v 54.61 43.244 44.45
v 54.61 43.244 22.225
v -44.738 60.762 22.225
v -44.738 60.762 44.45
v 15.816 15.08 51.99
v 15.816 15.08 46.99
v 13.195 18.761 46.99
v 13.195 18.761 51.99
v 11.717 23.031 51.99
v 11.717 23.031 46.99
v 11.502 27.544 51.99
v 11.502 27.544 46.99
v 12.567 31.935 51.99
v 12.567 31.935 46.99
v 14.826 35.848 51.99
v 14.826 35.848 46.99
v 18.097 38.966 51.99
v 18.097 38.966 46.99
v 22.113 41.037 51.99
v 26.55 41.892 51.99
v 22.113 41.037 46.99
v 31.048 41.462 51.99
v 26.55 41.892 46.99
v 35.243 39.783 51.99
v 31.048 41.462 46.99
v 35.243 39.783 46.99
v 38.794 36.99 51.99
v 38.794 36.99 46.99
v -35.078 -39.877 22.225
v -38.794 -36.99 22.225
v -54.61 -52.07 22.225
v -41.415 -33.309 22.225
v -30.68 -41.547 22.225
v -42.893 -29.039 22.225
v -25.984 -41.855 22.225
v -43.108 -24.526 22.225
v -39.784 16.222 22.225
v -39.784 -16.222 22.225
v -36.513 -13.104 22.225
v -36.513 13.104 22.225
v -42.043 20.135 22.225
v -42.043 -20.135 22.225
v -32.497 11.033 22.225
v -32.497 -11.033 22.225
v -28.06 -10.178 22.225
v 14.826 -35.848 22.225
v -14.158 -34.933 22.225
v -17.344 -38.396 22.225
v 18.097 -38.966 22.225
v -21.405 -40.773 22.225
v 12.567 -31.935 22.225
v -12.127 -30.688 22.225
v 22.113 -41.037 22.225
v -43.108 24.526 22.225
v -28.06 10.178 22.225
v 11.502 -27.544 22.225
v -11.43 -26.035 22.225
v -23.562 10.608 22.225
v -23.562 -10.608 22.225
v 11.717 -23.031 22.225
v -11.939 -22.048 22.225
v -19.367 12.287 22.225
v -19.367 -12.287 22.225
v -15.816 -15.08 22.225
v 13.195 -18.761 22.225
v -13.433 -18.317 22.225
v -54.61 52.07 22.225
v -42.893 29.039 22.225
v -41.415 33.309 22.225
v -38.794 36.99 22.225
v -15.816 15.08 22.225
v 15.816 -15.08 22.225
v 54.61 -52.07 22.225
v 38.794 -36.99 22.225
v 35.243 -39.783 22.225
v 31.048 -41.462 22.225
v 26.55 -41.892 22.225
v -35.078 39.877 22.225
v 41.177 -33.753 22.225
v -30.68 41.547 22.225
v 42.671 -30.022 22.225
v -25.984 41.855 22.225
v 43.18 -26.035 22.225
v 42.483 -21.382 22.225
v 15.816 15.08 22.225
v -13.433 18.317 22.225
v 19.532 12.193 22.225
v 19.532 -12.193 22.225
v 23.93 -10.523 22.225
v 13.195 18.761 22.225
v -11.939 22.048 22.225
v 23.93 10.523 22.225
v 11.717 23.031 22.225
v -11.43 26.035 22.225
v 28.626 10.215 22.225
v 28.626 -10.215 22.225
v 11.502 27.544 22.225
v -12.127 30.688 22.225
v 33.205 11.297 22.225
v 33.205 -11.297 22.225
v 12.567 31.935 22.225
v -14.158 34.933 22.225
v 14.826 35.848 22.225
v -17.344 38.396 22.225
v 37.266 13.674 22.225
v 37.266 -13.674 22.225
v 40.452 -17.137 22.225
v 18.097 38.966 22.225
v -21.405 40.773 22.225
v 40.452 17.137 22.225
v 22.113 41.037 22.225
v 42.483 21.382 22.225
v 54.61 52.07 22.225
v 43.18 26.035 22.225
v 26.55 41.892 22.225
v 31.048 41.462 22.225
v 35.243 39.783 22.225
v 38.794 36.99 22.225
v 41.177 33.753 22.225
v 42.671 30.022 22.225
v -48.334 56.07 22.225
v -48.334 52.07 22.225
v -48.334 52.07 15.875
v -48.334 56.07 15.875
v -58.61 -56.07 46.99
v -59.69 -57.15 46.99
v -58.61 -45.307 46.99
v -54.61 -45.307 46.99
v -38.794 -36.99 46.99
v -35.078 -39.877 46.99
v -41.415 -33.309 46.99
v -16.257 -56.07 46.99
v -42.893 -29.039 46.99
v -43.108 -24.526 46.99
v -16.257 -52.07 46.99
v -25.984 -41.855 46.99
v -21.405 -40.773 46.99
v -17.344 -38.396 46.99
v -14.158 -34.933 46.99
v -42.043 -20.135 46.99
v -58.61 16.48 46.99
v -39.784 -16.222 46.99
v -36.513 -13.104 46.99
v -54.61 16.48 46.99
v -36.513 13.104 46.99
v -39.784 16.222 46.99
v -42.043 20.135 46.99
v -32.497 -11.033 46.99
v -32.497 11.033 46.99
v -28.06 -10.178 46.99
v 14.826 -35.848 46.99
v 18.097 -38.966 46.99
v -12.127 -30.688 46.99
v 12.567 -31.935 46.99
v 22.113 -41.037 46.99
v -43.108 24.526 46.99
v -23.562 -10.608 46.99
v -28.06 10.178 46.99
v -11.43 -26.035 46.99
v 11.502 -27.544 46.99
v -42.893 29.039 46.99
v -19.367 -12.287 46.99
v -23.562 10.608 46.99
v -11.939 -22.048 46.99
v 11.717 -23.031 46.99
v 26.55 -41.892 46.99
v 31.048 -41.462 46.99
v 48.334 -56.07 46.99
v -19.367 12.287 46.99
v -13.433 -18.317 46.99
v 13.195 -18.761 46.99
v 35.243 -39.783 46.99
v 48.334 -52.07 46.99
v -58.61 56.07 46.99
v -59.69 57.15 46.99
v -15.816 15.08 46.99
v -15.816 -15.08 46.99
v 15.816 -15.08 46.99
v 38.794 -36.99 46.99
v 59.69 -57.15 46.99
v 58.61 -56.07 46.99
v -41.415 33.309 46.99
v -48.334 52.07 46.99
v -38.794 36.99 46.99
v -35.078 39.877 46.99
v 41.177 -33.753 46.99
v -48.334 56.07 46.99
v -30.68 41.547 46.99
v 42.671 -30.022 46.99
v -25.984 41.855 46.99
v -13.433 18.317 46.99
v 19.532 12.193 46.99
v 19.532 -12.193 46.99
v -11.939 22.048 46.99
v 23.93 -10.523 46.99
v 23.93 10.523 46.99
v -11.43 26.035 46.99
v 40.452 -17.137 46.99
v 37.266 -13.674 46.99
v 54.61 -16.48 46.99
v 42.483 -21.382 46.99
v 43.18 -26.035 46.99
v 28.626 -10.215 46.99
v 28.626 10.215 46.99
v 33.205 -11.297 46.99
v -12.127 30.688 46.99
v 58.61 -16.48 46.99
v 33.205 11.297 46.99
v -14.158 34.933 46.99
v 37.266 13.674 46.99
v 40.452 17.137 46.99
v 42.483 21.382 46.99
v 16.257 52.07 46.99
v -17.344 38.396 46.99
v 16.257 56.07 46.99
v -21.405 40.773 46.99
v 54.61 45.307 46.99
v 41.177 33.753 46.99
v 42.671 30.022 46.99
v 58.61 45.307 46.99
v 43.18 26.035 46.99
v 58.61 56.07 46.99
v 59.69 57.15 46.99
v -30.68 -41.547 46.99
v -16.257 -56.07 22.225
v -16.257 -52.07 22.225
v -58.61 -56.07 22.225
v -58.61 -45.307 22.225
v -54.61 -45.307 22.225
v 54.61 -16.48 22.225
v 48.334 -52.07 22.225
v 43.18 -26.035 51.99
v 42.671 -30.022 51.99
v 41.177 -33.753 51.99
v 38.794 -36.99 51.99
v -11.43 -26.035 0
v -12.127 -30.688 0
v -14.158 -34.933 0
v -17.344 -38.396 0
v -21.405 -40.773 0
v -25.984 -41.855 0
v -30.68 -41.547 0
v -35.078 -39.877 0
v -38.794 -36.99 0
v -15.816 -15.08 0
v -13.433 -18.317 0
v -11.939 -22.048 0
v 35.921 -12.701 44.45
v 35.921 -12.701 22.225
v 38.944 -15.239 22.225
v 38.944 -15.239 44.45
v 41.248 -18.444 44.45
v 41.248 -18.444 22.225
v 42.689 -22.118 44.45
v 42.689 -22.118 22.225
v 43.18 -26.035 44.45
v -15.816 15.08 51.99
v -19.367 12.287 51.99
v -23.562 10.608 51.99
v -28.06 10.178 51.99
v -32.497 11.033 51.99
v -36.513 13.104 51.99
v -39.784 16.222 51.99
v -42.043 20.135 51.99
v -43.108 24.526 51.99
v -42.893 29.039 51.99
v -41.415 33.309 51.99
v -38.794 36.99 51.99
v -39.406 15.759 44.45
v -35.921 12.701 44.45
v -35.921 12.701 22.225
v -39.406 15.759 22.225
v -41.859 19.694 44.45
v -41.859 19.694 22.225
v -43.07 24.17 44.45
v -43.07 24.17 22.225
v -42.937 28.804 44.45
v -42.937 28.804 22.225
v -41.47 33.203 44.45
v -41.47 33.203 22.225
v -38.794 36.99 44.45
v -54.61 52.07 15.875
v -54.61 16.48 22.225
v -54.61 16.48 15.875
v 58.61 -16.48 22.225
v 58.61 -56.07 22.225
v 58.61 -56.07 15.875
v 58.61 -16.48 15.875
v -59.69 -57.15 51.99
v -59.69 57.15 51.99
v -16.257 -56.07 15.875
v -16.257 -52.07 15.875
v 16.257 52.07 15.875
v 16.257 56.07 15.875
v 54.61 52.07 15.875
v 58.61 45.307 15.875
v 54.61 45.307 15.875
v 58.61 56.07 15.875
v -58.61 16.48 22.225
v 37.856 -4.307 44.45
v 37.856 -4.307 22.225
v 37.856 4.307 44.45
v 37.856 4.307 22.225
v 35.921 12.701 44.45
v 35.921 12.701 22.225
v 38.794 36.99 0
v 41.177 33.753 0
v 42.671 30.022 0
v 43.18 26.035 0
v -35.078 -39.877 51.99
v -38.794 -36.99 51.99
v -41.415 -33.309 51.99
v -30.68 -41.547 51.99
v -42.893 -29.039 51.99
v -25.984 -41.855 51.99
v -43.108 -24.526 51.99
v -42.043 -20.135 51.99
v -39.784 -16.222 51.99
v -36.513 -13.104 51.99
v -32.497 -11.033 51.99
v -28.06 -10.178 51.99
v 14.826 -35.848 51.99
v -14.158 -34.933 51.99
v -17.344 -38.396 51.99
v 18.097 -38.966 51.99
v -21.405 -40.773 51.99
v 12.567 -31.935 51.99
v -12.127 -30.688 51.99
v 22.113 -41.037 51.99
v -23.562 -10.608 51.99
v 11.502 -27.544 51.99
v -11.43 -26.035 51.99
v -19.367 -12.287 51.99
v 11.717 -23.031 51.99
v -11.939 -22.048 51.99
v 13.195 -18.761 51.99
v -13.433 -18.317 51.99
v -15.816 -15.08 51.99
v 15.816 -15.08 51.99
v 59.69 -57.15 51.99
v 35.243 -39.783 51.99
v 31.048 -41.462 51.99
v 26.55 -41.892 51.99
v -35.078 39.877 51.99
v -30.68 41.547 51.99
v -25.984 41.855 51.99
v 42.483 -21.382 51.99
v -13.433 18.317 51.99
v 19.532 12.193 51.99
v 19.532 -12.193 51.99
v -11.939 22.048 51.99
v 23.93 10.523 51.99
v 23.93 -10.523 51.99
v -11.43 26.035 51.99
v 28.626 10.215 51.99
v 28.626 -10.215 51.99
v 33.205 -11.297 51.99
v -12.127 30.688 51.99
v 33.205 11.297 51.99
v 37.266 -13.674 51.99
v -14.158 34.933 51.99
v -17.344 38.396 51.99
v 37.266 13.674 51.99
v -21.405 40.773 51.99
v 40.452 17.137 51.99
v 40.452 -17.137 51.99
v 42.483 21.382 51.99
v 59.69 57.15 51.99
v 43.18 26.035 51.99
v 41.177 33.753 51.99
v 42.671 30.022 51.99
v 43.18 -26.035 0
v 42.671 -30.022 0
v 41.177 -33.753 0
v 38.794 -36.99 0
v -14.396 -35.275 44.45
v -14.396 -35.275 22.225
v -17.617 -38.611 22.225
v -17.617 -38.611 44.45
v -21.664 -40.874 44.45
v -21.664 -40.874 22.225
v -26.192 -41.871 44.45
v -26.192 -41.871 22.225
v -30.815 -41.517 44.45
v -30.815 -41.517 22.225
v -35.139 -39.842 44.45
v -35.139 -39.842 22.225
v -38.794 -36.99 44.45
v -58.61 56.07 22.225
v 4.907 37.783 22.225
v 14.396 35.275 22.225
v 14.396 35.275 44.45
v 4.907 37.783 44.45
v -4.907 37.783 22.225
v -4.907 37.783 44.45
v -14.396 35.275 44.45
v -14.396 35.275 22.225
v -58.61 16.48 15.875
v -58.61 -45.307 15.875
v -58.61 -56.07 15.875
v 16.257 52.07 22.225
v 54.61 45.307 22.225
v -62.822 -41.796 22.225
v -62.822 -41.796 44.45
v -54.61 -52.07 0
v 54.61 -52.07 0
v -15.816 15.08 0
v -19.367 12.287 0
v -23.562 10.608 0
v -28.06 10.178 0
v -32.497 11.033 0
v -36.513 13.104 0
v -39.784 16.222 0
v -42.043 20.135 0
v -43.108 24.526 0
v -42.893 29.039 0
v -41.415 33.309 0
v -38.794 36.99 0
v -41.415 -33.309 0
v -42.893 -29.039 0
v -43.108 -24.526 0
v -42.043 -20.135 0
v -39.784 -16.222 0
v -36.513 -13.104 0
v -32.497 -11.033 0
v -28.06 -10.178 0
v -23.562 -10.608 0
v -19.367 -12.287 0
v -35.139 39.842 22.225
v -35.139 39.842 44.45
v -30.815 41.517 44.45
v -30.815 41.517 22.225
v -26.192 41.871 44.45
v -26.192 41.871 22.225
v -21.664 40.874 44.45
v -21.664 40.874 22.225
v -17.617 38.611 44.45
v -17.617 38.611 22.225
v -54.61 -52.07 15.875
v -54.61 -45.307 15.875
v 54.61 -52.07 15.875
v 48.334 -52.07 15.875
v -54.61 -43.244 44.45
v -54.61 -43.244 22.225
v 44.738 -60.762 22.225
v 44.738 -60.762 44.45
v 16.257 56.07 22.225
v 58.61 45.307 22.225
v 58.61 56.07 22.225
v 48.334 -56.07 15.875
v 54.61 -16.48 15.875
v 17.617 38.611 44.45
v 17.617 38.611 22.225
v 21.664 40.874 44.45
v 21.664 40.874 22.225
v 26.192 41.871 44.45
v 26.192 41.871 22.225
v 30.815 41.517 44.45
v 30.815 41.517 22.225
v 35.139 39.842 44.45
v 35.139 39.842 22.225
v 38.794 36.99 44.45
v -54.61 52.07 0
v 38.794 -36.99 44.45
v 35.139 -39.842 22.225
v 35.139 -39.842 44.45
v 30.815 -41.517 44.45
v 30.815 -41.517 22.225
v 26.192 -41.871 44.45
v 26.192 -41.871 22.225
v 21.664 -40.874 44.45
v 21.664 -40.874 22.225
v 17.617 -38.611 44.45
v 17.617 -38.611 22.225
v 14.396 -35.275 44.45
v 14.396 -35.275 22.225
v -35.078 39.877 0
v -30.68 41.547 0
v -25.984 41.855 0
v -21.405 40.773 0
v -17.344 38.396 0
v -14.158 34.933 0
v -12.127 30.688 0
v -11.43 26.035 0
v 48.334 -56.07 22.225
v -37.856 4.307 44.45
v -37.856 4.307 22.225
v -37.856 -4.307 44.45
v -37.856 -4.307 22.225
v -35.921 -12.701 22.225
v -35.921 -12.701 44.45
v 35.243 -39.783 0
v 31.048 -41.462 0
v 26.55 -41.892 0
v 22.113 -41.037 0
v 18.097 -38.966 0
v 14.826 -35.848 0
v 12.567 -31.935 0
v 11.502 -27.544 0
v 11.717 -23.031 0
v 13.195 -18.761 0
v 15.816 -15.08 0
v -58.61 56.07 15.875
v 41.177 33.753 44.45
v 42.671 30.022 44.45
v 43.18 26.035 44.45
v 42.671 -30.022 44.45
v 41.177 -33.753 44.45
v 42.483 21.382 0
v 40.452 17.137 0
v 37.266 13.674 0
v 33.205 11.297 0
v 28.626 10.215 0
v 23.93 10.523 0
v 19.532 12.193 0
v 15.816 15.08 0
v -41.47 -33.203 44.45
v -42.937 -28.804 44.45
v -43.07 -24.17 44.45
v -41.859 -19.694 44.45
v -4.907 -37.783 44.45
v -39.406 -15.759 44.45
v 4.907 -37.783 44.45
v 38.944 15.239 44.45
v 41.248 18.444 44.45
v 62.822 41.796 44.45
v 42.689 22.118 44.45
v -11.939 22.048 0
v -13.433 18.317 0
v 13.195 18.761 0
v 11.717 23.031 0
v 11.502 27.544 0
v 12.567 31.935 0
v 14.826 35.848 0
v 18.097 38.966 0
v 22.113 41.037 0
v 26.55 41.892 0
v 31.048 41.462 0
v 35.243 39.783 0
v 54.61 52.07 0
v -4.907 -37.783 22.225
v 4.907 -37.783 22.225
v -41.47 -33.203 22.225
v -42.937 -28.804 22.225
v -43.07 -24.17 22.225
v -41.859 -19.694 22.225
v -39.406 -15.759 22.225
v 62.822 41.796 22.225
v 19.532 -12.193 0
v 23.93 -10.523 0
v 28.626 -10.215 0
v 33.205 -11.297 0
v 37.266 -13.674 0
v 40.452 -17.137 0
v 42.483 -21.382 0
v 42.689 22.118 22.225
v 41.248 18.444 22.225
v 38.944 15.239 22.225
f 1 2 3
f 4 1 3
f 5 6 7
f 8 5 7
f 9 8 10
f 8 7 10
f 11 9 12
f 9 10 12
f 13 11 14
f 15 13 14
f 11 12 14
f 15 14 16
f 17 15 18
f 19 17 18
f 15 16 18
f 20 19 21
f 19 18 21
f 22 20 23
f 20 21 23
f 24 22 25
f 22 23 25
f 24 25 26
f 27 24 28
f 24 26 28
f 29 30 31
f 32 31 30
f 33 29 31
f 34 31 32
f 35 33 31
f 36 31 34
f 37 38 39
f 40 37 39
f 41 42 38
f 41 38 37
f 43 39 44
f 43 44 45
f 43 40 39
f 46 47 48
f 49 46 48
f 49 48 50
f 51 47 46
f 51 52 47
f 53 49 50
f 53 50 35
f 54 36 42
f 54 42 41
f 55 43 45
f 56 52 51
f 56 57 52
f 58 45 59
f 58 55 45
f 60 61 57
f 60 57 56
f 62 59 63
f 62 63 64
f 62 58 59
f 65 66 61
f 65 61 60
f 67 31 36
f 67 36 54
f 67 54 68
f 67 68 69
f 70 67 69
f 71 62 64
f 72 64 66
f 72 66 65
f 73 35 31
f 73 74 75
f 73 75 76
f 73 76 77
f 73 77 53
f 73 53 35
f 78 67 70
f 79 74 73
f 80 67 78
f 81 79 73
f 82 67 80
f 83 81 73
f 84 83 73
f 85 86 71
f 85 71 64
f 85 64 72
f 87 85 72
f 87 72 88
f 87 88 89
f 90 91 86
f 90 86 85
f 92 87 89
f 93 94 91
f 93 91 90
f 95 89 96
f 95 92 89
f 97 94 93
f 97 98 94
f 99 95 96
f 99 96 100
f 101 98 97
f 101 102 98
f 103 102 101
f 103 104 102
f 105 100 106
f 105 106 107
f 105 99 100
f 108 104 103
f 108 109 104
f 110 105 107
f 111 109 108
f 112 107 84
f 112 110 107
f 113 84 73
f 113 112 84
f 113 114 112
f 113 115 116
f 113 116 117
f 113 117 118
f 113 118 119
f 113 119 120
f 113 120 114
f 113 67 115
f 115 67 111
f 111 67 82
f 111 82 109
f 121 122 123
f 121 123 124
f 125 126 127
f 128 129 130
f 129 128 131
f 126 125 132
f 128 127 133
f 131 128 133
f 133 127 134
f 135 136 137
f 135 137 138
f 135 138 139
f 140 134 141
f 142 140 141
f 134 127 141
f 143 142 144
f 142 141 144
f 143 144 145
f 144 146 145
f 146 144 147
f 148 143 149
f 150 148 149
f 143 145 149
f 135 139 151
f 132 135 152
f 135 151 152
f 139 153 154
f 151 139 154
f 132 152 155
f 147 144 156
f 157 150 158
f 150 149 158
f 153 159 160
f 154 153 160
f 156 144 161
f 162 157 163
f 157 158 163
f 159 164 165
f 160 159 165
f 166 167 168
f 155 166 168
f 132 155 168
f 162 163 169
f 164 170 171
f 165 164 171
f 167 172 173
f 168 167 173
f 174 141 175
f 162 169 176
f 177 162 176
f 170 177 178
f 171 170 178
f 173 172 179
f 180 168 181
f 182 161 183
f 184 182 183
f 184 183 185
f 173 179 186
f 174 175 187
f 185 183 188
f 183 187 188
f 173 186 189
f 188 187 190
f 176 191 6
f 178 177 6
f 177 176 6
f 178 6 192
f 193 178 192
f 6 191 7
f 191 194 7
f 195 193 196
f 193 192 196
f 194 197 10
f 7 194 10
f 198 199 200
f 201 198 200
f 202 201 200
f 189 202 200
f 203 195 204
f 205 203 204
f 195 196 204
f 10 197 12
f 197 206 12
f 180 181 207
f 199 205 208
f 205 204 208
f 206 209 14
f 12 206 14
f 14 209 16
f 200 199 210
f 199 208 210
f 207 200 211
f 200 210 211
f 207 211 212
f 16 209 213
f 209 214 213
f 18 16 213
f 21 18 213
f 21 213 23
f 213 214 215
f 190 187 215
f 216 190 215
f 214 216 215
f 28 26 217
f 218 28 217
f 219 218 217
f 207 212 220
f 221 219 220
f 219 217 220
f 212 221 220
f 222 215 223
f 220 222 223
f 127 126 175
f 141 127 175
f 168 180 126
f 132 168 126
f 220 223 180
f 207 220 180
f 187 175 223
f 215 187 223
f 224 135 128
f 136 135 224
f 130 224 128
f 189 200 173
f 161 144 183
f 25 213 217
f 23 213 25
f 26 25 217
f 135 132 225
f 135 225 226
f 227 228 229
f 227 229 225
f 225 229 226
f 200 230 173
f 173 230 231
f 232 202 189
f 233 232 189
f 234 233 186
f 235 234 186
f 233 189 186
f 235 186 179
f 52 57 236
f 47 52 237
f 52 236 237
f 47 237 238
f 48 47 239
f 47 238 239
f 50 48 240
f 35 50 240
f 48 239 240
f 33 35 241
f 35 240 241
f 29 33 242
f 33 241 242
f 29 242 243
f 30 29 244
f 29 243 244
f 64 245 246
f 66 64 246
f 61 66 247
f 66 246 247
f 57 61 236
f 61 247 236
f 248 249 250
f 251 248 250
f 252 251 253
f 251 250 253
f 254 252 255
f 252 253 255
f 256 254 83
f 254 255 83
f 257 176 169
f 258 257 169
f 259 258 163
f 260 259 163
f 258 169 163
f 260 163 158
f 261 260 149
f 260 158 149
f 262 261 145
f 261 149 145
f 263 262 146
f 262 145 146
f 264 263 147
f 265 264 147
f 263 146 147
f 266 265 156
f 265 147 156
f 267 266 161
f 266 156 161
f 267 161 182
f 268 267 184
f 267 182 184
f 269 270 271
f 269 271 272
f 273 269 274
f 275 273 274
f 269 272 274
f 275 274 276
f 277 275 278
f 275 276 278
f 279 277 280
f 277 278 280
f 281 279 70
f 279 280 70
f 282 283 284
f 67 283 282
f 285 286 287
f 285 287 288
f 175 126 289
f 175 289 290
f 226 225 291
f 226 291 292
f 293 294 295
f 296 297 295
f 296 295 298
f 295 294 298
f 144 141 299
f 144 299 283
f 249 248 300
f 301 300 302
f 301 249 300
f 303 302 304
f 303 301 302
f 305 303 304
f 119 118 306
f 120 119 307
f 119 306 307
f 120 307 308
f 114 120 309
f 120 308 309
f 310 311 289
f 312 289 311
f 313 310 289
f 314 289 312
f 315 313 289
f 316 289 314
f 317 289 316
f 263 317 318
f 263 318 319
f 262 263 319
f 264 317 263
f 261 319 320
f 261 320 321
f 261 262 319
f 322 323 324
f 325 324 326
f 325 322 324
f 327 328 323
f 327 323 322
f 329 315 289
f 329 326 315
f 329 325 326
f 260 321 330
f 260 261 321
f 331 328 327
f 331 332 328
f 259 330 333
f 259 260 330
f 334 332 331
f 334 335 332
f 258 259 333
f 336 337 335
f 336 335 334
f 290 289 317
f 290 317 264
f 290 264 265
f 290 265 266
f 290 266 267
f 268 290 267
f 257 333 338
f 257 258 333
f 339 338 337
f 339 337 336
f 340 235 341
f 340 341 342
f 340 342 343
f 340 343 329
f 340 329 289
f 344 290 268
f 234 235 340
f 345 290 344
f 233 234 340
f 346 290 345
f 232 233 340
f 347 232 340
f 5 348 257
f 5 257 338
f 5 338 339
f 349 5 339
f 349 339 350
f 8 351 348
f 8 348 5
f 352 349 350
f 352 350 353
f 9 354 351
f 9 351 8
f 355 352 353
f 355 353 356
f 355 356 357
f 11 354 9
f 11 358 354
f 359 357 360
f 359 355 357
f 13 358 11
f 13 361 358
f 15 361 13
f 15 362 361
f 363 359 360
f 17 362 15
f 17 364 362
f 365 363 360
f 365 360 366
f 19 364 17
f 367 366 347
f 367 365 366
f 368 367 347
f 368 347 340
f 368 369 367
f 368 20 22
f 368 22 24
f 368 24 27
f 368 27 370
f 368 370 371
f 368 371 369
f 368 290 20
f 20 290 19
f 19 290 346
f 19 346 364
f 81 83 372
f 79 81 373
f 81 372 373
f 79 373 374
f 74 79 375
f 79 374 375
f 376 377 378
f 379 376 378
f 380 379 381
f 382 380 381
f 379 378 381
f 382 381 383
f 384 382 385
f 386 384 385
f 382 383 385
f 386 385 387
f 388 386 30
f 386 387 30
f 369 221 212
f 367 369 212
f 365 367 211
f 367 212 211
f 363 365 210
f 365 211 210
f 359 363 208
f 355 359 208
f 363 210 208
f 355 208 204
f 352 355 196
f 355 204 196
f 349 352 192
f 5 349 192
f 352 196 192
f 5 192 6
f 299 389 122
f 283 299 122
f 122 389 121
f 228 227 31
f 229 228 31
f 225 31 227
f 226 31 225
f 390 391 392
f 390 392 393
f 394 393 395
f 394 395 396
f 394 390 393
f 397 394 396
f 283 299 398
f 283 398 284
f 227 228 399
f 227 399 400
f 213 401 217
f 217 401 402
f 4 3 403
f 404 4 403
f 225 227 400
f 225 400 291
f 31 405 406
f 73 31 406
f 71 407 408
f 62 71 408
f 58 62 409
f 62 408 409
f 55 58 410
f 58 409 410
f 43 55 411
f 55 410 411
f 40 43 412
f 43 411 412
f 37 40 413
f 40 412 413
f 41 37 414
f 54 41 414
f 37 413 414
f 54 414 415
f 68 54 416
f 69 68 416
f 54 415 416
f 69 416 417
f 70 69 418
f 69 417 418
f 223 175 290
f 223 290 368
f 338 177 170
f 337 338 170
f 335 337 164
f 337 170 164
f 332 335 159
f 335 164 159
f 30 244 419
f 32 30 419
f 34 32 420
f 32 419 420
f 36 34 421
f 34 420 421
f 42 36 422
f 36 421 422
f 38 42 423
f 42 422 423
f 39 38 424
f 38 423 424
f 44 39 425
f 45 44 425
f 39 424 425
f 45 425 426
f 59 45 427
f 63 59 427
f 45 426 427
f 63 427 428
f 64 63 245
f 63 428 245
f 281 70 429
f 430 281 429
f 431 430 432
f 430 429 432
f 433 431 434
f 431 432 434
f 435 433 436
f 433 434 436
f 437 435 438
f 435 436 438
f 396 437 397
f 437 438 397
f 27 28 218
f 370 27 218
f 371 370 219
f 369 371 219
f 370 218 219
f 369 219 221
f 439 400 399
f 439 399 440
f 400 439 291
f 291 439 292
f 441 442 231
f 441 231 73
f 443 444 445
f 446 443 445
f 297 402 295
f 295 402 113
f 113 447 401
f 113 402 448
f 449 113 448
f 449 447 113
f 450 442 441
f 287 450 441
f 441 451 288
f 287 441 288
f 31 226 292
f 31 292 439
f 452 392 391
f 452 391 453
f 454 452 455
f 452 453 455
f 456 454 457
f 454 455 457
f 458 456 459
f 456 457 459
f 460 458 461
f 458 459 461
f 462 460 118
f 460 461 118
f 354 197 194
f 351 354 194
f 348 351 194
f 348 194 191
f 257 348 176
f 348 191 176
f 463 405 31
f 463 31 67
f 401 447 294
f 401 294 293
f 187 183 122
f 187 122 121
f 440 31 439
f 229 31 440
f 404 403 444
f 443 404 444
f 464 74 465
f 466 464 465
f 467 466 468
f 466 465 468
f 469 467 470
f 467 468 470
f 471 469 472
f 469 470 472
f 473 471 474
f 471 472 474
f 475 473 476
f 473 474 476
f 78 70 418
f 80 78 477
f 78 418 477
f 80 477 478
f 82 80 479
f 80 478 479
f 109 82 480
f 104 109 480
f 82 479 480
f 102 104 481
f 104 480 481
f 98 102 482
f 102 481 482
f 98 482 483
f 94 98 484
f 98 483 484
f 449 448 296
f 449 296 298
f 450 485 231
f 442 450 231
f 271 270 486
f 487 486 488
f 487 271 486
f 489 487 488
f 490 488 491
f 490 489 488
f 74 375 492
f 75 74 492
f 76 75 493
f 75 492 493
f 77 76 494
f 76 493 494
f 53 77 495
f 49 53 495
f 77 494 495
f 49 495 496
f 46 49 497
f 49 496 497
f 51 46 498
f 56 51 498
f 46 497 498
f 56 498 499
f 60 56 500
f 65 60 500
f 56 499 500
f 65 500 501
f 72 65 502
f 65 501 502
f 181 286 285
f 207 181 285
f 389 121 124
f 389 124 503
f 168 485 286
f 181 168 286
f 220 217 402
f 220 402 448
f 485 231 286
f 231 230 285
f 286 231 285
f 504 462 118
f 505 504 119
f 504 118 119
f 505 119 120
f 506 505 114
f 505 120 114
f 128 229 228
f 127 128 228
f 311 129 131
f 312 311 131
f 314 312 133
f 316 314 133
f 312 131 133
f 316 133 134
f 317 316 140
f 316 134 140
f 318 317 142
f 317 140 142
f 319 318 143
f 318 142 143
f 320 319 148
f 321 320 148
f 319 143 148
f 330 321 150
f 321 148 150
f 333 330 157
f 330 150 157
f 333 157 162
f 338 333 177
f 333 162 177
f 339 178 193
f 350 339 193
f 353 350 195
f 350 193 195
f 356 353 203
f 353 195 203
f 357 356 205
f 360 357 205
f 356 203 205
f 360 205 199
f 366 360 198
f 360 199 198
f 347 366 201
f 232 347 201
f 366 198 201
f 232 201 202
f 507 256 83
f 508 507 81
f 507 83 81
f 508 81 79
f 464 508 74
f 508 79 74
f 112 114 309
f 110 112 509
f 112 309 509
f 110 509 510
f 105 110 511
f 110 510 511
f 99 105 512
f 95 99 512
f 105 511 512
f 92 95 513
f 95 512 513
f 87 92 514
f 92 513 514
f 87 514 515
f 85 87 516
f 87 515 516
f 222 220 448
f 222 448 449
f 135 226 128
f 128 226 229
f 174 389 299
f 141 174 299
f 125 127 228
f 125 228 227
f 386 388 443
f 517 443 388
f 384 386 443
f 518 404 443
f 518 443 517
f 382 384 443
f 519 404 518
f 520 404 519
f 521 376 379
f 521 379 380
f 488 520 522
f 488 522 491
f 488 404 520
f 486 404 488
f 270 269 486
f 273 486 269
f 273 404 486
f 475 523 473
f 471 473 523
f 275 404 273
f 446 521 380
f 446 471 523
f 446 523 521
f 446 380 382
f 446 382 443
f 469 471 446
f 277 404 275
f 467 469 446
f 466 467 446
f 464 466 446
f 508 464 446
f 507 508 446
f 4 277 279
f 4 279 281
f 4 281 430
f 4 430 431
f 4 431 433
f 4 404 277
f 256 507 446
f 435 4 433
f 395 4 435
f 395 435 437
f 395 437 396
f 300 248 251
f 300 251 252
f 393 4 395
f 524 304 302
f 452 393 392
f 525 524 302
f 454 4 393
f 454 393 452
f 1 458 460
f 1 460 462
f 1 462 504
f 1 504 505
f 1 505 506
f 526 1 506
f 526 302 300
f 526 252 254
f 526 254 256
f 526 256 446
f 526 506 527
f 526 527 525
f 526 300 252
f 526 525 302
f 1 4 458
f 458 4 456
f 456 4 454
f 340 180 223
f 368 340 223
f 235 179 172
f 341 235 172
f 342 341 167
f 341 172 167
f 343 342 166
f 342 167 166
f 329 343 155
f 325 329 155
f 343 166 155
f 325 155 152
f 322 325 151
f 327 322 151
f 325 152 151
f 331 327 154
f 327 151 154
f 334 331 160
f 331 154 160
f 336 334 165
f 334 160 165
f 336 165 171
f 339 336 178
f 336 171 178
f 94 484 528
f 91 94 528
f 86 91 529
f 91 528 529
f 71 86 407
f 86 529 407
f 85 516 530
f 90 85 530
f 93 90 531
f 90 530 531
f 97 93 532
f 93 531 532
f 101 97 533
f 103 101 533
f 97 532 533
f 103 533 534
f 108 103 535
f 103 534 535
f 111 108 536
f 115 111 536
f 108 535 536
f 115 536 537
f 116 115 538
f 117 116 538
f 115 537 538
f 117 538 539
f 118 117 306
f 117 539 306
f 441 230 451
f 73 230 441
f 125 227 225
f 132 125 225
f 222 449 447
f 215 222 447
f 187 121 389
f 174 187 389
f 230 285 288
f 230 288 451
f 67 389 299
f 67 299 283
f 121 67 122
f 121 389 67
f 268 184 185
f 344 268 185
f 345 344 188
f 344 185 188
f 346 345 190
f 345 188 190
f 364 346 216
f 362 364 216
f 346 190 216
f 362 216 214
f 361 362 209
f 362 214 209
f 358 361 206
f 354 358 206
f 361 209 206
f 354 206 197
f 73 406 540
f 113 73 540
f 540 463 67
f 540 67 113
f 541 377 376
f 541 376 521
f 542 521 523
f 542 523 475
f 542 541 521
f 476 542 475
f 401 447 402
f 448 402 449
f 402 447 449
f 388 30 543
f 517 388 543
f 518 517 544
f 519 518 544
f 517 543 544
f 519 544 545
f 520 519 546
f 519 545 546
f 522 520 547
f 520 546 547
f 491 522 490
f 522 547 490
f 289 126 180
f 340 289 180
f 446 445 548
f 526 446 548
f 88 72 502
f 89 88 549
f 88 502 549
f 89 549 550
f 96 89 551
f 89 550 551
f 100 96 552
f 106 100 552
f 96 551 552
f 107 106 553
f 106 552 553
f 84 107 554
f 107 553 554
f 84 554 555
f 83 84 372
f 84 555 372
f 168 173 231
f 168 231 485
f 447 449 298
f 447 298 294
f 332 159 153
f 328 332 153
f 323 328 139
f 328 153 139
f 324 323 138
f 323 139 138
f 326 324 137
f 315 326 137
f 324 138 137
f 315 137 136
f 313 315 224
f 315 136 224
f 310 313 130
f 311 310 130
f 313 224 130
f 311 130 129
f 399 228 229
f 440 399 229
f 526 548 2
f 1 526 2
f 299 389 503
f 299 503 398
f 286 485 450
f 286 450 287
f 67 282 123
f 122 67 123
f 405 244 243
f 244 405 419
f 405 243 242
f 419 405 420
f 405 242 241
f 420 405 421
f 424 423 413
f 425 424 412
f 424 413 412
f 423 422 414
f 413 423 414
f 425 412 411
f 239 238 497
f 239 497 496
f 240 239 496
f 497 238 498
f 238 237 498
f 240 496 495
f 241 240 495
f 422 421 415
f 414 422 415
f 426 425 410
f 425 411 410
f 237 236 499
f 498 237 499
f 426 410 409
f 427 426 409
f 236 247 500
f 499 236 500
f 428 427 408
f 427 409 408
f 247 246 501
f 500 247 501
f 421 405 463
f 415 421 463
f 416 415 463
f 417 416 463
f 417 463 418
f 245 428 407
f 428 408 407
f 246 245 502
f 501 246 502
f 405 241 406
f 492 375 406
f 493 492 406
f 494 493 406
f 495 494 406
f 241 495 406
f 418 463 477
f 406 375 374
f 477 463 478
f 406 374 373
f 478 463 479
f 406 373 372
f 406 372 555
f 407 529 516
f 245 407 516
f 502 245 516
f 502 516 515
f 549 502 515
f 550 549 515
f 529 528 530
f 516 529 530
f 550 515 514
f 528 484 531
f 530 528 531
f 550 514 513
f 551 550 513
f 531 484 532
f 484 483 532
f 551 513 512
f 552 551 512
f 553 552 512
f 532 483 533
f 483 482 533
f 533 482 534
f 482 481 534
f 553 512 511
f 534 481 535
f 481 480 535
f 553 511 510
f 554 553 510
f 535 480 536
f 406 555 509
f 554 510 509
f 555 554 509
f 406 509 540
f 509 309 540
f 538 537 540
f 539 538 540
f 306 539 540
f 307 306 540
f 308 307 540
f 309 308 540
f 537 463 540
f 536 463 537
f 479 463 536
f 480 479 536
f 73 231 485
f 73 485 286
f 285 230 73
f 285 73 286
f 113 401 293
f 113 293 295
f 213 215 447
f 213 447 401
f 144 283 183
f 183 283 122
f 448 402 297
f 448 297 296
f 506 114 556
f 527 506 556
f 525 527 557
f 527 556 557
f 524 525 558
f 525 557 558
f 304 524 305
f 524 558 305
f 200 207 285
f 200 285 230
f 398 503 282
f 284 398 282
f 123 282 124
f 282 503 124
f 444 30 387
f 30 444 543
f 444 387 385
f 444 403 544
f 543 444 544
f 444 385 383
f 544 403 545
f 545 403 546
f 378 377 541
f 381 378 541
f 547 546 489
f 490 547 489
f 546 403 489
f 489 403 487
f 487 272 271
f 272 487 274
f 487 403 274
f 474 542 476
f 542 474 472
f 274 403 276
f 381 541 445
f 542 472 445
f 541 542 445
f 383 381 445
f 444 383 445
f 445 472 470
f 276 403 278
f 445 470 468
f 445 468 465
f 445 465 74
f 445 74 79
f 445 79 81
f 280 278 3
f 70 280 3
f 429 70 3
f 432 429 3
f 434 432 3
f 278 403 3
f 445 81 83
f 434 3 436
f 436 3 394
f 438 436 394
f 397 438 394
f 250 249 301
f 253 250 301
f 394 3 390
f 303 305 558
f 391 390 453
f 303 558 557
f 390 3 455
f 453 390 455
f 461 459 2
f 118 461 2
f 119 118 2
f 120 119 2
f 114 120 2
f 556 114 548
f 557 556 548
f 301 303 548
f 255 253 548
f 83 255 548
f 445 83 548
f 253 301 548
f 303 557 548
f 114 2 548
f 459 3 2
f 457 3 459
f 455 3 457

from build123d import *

# Parameters (mm, degrees)
F0_W      = 109.22
F0_H      = 104.14
F1_DEPTH  = 22.225
F2_R      = 38.1
F3_DEPTH  = 22.225
F4_W      = 6.2755517351
F4_H      = 4
F5_DEPTH  = 6.35
F4_W_2    = 4
F4_H_2    = 6.7626058602
F6_DEPTH  = 25.4
F8_W      = 119.38
F8_H      = 114.3
F9_DEPTH  = 5
F11_DEPTH = 89.408


with BuildPart() as f1:
    # F0 (on Top) → F1 (new body)
    with BuildSketch(Plane.XY):
        Rectangle(F0_W, F0_H)
    extrude(amount=F1_DEPTH)


with BuildPart() as f3:
    # F2 (on face) → F3 (new body)
    with BuildSketch(Plane.XY.offset(22.225)):
        Polygon((-4.5555347098, -52.07), (44.7384907809, -60.7618666817), (46.2711013896, -52.07), align=None)
        Polygon((-54.61, -43.2440472644), (-4.5555347098, -52.07), (46.2711013896, -52.07), (54.61, -4.7777559152), (54.61, 43.2440472644), (4.5555347098, 52.07), (-46.2711013896, 52.07), (-54.61, 4.7777559152), align=None)
        Circle(F2_R, mode=Mode.SUBTRACT)
        Polygon((54.61, 43.2440472644), (54.61, -4.7777559152), (62.8222120031, 41.796012717), align=None)
        Polygon((-44.7384907809, 60.7618666817), (-46.2711013896, 52.07), (4.5555347098, 52.07), align=None)
        Polygon((-62.8222120031, -41.796012717), (-54.61, -43.2440472644), (-54.61, 4.7777559152), align=None)
    extrude(amount=F3_DEPTH)


with BuildPart() as f5:
    # F4 (on face) → F5 (new body)
    with BuildSketch(Plane.XY.offset(22.225)):
        with Locations((-51.4722241325, 54.07)):
            Rectangle(F4_W, F4_H)
        Polygon((-54.61, 16.4795775369), (-54.61, 52.07), (-54.61, 56.07), (-58.61, 56.07), (-58.61, 16.4795775369), align=None)
    extrude(amount=-F5_DEPTH)


with BuildPart() as f5b:
    # F4 (on face) → F5, piece 2 (new body)
    with BuildSketch(Plane.XY.offset(22.225)):
        with Locations((-56.61, -48.6886970699)):
            Rectangle(F4_W_2, F4_H_2)
        Polygon((-16.2573563315, -56.07), (-16.2573563315, -52.07), (-54.61, -52.07), (-58.61, -52.07), (-58.61, -56.07), align=None)
    extrude(amount=-F5_DEPTH)


with BuildPart() as f5c:
    # F4 (on face) → F5, piece 3 (new body)
    with BuildSketch(Plane.XY.offset(22.225)):
        with Locations((51.4722241325, -54.07)):
            Rectangle(F4_W, F4_H)
        Polygon((58.61, -16.4795775369), (54.61, -16.4795775369), (54.61, -52.07), (54.61, -56.07), (58.61, -56.07), align=None)
    extrude(amount=-F5_DEPTH)


with BuildPart() as f5d:
    # F4 (on face) → F5, piece 4 (new body)
    with BuildSketch(Plane.XY.offset(22.225)):
        Polygon((16.2573563315, 56.07), (16.2573563315, 52.07), (54.61, 52.07), (58.61, 52.07), (58.61, 56.07), align=None)
        with Locations((56.61, 48.6886970699)):
            Rectangle(F4_W_2, F4_H_2)
    extrude(amount=-F5_DEPTH)


with BuildPart() as f6:
    # F4 (on face) + F5_face (on face) → F6 (new body)
    with BuildSketch(Plane.XY.offset(22.225)):
        Polygon((54.61, -16.4795775369), (48.3344482649, -52.07), (54.61, -52.07), align=None)
        Polygon((54.61, 52.07), (16.2573563315, 52.07), (54.61, 45.3073941398), align=None)
        Polygon((-48.3344482649, 52.07), (-54.61, 52.07), (-54.61, 16.4795775369), align=None)
        Polygon((-16.2573563315, -52.07), (-54.61, -45.3073941398), (-54.61, -52.07), align=None)
    with BuildSketch(Plane(origin=(40.074037477, 53.3290563811, 22.225), x_dir=(1, 0, 0), z_dir=(0, 0, 1))):
        Polygon((-23.8166811454, 2.7409436189), (-23.8166811454, -1.2590563811), (14.535962523, -1.2590563811), (14.535962523, -8.0216622413), (18.535962523, -8.0216622413), (18.535962523, 2.7409436189), align=None)
        Polygon((8.260410788, -105.3990563811), (8.260410788, -109.3990563811), (18.535962523, -109.3990563811), (18.535962523, -69.808633918), (14.535962523, -69.808633918), (14.535962523, -105.3990563811), align=None)
        Polygon((-94.684037477, -105.3990563811), (-94.684037477, -98.6364505208), (-98.684037477, -98.6364505208), (-98.684037477, -109.3990563811), (-56.3313938085, -109.3990563811), (-56.3313938085, -105.3990563811), align=None)
        Polygon((-94.684037477, -1.2590563811), (-88.4084857419, -1.2590563811), (-88.4084857419, 2.7409436189), (-98.684037477, 2.7409436189), (-98.684037477, -36.8494788442), (-94.684037477, -36.8494788442), align=None)
    extrude(amount=F6_DEPTH)

    # F8 (on offset) → F9 (join)
    with BuildSketch(Plane.XY.offset(46.99)):
        Rectangle(F8_W, F8_H)
    extrude(amount=F9_DEPTH)


with BuildPart() as f11_tool:
    # F10 (on face) → F11 (new body)
    with BuildSketch(Plane(origin=(0, 0, 0), x_dir=(1, 0, 0), z_dir=(0, 0, -1))):
        with BuildLine():
            Line((-38.7943335263, 36.9899459205), (-15.8156664737, 15.0800540795))
            ThreePointArc((-15.8156664737, 15.0800540795), (-12.5671440716, 20.1348959641), (-11.43, 26.035))
            ThreePointArc((-11.43, 26.035), (-21.4048959641, 40.7728559284), (-38.7943335263, 36.9899459205))
        make_face()
        with BuildLine():
            ThreePointArc((-38.7943335263, 36.9899459205), (-38.2599459205, 14.5456664737), (-15.8156664737, 15.0800540795))
            Line((-15.8156664737, 15.0800540795), (-38.7943335263, 36.9899459205))
        make_face()
        with BuildLine():
            Line((-38.7943335263, -36.9899459205), (-15.8156664737, -15.0800540795))
            ThreePointArc((-15.8156664737, -15.0800540795), (-38.2599459205, -14.5456664737), (-38.7943335263, -36.9899459205))
        make_face()
        with BuildLine():
            ThreePointArc((-11.43, -26.035), (-12.5671440716, -20.1348959641), (-15.8156664737, -15.0800540795))
            Line((-15.8156664737, -15.0800540795), (-38.7943335263, -36.9899459205))
            ThreePointArc((-38.7943335263, -36.9899459205), (-21.4048959641, -40.7728559284), (-11.43, -26.035))
        make_face()
        with BuildLine():
            Line((38.7943335263, -36.9899459205), (15.8156664737, -15.0800540795))
            ThreePointArc((15.8156664737, -15.0800540795), (16.3500540795, -37.5243335263), (38.7943335263, -36.9899459205))
        make_face()
        with BuildLine():
            ThreePointArc((43.18, -26.035), (33.2051040359, -11.2971440716), (15.8156664737, -15.0800540795))
            Line((15.8156664737, -15.0800540795), (38.7943335263, -36.9899459205))
            ThreePointArc((38.7943335263, -36.9899459205), (42.0428559284, -31.9351040359), (43.18, -26.035))
        make_face()
        with BuildLine():
            Line((38.7943335263, 36.9899459205), (15.8156664737, 15.0800540795))
            ThreePointArc((15.8156664737, 15.0800540795), (33.2051040359, 11.2971440716), (43.18, 26.035))
            ThreePointArc((43.18, 26.035), (42.0428559284, 31.9351040359), (38.7943335263, 36.9899459205))
        make_face()
        with BuildLine():
            ThreePointArc((38.7943335263, 36.9899459205), (16.3500540795, 37.5243335263), (15.8156664737, 15.0800540795))
            Line((15.8156664737, 15.0800540795), (38.7943335263, 36.9899459205))
        make_face()
    extrude(amount=-F11_DEPTH)


with BuildPart() as f1_1:
    add(f1.part)

    # F11: cut by f11_tool
    add(f11_tool.part, mode=Mode.SUBTRACT)


with BuildPart() as f3_1:
    add(f3.part)

    # F11: cut by f11_tool
    add(f11_tool.part, mode=Mode.SUBTRACT)


with BuildPart() as f6_1:
    add(f6.part)

    # F11: cut by f11_tool
    add(f11_tool.part, mode=Mode.SUBTRACT)


solid = Compound([f5.part, f5b.part, f5c.part, f5d.part, f1_1.part, f3_1.part, f6_1.part])
